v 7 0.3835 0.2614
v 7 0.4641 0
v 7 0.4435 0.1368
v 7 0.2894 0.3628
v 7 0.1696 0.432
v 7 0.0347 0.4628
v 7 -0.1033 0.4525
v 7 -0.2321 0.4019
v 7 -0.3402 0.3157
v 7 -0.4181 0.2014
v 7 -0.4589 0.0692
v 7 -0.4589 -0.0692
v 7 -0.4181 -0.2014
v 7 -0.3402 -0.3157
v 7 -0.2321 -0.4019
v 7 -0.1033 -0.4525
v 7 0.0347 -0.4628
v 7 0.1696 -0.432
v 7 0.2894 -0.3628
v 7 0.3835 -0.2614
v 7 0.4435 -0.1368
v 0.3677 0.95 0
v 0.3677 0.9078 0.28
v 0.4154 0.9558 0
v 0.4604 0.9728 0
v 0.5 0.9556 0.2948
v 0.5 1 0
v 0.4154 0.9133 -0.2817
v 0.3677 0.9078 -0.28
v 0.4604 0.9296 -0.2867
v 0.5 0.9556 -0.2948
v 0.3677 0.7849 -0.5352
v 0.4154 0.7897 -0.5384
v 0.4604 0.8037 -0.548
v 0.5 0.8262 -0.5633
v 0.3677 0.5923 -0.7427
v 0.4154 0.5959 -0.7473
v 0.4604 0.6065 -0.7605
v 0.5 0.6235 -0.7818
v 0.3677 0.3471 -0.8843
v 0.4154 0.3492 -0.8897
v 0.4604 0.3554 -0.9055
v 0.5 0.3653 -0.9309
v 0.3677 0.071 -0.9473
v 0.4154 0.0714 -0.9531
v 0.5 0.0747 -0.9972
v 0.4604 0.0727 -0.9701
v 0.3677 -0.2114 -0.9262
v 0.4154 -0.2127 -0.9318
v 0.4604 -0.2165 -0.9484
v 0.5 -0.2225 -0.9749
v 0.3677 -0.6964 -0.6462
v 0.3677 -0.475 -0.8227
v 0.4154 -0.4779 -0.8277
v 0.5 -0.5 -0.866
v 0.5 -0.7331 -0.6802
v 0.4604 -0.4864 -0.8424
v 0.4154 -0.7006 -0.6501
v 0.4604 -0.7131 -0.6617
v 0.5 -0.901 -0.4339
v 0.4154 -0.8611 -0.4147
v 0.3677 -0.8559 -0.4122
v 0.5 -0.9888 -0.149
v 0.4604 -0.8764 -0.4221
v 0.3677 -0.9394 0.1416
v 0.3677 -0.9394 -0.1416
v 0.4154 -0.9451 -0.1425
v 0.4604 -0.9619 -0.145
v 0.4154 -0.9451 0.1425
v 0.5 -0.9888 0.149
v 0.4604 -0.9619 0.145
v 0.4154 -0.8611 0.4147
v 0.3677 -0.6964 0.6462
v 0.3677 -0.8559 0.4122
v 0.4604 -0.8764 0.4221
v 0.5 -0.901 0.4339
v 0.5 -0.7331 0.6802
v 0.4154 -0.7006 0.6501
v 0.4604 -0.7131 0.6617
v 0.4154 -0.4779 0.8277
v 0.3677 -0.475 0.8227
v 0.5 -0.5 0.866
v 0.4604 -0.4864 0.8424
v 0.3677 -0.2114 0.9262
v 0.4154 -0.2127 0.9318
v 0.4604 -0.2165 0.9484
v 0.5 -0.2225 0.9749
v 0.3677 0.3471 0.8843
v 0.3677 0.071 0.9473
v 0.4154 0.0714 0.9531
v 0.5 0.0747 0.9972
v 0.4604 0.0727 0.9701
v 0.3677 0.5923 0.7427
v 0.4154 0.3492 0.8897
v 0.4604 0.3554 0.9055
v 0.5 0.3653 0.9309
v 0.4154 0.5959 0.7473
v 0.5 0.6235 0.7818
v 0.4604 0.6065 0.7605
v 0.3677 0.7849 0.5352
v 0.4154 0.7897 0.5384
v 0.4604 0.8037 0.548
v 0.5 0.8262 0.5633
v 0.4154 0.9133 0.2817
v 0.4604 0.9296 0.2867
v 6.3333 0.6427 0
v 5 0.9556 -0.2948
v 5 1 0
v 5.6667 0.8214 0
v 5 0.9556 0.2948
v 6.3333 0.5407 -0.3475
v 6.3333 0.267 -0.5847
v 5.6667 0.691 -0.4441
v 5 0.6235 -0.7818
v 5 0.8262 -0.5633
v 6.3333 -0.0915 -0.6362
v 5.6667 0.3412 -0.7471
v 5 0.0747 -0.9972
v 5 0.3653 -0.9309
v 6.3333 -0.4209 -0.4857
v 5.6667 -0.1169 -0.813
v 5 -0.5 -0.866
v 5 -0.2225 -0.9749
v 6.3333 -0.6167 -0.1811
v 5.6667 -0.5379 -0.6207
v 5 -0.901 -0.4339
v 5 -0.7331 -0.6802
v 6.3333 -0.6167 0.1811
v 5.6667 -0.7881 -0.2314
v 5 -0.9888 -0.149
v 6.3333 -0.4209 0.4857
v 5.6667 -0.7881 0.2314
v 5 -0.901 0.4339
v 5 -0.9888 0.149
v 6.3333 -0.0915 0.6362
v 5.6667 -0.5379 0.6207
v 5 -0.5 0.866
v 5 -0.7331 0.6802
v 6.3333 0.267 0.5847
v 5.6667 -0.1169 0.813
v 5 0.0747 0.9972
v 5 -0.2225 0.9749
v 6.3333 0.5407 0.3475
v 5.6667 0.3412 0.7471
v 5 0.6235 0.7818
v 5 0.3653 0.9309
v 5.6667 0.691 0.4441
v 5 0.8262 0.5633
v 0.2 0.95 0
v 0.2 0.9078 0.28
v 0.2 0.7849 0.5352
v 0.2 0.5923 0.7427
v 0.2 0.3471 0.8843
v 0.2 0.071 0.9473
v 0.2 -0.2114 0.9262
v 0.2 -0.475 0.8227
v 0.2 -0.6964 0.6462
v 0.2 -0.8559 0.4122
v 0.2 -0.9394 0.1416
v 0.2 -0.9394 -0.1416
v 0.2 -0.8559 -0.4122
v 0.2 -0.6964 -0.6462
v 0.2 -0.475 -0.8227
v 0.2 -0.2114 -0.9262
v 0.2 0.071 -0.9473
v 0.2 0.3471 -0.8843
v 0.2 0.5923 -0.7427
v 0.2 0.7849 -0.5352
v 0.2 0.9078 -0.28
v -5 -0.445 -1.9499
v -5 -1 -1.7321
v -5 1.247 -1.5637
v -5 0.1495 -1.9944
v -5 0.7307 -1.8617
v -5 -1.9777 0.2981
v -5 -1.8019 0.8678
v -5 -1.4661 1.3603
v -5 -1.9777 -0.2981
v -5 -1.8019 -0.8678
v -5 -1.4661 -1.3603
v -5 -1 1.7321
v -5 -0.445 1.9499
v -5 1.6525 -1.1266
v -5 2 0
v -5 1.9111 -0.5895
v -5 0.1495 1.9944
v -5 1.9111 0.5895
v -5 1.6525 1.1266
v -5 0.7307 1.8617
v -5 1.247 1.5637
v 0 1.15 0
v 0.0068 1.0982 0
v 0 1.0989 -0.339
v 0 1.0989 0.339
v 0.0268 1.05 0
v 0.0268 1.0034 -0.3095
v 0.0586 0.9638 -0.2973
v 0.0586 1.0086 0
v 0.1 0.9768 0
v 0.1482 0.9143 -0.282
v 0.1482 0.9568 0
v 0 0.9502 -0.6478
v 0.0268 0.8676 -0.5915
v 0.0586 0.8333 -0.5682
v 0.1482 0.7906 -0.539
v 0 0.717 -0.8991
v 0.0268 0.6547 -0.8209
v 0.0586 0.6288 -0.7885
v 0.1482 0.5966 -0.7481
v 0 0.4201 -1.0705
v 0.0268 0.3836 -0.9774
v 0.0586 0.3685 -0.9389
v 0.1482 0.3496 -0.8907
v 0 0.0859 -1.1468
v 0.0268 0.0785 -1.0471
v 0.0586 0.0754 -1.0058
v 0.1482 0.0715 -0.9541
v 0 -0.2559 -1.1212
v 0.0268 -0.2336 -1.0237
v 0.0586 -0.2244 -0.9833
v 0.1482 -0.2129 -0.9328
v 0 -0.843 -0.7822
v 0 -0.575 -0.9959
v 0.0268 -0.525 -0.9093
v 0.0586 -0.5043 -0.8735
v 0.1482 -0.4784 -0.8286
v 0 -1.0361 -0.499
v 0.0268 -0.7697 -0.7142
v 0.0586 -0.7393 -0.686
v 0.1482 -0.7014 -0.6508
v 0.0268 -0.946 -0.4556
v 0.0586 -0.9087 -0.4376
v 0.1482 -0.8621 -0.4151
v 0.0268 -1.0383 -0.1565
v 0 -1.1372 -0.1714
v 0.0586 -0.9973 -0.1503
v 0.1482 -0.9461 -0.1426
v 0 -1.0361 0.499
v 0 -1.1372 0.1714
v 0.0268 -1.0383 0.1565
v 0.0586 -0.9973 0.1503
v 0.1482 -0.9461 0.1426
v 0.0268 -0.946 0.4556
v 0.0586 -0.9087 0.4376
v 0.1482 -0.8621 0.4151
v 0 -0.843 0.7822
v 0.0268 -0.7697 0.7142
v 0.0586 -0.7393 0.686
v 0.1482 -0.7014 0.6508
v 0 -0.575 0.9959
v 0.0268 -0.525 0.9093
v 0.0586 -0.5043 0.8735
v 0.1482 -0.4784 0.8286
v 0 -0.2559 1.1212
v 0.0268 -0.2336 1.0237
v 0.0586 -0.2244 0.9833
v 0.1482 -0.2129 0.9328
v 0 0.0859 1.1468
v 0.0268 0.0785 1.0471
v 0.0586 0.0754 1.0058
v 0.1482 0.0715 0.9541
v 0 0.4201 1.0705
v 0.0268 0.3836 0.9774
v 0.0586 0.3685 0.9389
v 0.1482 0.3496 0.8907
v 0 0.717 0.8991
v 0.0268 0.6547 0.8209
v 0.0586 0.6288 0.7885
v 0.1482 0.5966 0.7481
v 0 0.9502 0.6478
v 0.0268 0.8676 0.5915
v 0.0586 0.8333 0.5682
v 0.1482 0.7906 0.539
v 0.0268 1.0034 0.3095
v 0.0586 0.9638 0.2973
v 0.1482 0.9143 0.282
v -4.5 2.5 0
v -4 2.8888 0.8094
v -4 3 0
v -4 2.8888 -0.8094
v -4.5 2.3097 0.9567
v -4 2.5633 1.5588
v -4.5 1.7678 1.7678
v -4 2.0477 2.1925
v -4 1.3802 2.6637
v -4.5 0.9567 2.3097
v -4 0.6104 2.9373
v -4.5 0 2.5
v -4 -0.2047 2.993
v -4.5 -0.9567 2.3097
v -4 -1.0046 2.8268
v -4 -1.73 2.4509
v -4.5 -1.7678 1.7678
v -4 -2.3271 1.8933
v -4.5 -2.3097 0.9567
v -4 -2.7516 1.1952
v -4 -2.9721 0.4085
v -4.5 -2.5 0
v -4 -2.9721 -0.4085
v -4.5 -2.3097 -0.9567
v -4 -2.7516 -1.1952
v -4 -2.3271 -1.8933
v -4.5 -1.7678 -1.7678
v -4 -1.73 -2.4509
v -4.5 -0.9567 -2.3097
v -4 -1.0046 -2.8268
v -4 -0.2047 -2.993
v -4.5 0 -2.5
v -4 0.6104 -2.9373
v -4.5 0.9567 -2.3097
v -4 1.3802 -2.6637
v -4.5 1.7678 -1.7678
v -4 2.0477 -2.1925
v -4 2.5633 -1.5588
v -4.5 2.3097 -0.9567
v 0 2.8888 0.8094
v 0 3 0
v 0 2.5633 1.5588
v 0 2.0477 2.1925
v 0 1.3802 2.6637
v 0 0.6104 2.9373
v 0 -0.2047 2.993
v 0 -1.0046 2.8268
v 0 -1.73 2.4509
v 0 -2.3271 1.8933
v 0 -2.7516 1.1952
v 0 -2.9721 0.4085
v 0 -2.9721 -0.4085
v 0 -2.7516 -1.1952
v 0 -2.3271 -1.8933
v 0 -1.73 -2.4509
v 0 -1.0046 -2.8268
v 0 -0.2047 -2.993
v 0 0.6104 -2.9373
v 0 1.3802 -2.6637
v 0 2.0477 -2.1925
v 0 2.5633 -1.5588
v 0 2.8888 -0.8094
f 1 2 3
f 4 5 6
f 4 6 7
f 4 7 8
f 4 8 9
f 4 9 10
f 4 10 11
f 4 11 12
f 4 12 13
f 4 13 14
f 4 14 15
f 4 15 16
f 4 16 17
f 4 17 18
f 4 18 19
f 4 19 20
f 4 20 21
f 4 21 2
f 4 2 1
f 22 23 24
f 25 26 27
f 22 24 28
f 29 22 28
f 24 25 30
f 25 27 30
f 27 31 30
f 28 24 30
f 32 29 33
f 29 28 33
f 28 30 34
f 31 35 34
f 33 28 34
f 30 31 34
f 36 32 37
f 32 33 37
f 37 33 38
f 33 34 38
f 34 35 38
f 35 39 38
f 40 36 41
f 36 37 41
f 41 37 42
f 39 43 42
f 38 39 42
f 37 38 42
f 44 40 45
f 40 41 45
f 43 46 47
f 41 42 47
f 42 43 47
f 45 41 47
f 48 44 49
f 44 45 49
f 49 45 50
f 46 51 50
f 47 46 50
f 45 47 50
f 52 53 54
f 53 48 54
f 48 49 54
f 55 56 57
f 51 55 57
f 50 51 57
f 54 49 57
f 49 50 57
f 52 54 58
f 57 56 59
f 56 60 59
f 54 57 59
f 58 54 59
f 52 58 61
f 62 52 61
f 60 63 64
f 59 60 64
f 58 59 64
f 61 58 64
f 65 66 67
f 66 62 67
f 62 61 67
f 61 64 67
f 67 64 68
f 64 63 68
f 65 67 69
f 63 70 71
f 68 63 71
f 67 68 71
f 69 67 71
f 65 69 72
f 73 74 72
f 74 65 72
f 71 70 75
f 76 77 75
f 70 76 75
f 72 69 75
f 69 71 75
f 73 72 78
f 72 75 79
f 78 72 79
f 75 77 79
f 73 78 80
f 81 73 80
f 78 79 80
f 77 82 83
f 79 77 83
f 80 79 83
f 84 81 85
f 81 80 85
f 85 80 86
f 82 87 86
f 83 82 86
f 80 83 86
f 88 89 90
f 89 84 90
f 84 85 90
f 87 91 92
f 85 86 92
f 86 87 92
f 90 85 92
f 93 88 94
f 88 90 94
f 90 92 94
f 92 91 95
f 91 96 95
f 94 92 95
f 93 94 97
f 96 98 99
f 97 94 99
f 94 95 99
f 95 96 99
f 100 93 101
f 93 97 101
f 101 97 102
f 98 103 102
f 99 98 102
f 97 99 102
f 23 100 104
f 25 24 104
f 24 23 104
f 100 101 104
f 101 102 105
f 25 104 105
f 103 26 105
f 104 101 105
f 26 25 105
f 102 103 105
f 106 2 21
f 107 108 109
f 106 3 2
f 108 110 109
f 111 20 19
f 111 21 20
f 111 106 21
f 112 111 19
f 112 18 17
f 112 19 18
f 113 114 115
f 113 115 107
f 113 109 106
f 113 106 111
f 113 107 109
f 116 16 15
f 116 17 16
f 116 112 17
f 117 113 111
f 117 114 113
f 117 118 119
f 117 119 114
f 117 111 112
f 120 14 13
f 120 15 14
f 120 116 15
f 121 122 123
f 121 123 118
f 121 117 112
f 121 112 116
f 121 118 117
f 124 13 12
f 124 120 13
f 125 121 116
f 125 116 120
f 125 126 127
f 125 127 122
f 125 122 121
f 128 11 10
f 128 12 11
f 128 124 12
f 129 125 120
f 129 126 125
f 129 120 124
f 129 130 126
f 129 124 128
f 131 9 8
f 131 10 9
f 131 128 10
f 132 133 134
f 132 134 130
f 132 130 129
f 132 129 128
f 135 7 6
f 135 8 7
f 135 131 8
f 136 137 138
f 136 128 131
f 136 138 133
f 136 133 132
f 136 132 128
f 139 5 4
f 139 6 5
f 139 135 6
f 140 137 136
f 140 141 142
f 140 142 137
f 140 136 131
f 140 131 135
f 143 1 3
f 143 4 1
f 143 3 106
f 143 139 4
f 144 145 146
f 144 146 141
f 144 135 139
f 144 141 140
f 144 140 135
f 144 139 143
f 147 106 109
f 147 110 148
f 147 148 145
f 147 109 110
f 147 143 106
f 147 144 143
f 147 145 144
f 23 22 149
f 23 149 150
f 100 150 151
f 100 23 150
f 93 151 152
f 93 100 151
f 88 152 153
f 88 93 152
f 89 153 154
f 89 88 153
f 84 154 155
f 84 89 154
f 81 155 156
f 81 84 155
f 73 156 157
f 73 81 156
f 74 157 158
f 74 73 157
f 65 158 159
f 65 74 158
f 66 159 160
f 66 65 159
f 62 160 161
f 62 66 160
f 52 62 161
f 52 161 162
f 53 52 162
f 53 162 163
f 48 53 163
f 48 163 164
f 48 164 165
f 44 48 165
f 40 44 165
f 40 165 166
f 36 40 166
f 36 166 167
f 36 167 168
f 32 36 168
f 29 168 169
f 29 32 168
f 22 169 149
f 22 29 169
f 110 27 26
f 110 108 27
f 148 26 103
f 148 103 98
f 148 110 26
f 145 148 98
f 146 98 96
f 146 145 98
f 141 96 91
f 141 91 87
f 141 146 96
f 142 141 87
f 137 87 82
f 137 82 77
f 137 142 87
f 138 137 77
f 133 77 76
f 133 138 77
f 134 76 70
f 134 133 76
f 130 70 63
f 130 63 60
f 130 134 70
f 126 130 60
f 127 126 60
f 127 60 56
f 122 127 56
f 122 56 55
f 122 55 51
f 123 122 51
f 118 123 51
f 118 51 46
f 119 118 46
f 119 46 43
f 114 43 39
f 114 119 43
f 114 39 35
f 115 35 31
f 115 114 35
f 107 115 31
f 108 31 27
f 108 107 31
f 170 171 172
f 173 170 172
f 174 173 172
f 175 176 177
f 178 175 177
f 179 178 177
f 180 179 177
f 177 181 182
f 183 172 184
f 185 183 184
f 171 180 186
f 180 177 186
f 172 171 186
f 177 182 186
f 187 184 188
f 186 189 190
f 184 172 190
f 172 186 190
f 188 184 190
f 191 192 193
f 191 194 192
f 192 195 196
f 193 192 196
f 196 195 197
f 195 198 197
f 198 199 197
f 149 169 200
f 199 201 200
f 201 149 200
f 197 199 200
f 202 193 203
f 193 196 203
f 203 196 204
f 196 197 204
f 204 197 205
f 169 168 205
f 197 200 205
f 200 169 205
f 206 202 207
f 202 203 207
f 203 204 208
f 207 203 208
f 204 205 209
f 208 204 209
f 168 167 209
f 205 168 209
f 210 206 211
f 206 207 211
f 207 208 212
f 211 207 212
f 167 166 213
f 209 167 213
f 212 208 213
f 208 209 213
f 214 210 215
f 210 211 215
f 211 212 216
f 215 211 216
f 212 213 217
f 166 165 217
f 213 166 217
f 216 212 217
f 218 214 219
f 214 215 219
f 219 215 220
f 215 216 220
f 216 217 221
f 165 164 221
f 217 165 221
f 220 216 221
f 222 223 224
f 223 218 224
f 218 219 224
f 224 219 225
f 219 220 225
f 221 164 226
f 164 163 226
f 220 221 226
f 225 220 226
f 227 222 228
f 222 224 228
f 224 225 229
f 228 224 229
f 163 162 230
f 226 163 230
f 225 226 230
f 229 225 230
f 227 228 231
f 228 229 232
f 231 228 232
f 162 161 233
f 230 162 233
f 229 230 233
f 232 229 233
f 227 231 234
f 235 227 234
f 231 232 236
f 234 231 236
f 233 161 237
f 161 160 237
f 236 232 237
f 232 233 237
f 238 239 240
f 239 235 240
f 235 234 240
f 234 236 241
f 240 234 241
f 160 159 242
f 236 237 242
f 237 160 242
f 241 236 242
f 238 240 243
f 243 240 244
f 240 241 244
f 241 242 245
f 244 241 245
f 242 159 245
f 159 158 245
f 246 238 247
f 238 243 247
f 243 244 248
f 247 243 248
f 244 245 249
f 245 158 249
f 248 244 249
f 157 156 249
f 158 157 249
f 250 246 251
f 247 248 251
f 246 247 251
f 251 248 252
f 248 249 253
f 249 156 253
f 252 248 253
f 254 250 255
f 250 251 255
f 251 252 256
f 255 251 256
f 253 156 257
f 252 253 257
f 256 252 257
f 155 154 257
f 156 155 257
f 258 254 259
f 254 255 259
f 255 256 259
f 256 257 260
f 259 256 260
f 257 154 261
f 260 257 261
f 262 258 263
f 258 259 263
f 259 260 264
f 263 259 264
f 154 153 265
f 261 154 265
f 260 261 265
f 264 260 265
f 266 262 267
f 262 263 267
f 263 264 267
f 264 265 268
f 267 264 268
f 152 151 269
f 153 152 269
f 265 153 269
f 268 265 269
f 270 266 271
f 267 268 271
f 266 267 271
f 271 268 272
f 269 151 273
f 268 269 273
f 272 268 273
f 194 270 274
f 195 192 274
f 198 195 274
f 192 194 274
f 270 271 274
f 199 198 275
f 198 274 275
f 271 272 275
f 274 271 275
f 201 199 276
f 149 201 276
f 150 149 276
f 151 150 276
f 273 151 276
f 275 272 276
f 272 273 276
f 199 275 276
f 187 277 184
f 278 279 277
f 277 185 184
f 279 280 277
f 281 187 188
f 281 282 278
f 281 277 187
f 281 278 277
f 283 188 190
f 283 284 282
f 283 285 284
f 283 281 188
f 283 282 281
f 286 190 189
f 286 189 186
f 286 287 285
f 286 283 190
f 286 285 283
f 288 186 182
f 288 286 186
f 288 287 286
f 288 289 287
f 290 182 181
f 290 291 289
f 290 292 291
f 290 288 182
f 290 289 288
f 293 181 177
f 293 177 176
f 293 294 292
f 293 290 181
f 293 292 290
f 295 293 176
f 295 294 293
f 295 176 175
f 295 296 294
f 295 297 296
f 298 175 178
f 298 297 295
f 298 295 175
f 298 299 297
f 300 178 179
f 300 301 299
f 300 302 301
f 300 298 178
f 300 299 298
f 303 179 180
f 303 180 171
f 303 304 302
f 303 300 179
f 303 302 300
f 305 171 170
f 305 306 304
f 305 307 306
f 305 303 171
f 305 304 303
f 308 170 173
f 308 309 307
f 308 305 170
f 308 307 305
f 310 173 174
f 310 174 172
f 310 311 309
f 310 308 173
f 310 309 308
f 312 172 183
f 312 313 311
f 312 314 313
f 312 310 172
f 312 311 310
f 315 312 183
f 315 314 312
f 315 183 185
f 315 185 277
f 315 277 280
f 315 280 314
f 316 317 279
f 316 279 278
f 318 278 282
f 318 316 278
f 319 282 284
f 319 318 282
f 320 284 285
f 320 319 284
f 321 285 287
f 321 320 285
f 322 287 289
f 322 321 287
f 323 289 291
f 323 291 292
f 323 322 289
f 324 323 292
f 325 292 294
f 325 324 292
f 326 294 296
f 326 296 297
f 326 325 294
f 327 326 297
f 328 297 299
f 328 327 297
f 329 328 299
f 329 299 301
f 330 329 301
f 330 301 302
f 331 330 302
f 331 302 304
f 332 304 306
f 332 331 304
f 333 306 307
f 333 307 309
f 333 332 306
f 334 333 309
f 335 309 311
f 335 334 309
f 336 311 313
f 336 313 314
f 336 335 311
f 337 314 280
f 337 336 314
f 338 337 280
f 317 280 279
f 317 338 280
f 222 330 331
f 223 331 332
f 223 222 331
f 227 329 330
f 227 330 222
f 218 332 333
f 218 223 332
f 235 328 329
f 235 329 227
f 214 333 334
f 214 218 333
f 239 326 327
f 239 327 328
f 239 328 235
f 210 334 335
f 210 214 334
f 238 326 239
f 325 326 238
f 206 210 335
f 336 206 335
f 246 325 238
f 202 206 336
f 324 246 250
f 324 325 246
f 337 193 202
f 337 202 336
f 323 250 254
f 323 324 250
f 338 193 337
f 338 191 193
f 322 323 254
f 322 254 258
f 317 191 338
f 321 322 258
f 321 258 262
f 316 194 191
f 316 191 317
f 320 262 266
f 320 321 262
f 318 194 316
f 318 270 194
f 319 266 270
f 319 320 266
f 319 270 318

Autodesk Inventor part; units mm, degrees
ref_plane "YZ Plane" through (0, 0, 0) normal (1, 0, 0) x (0, 1, 0)
ref_plane "XZ Plane" through (0, 0, 0) normal (0, 1, 0) x (-1, 0, 0)
ref_plane "XY Plane" through (0, 0, 0) normal (0, 0, 1) x (1, 0, 0)
sketch "Sketch_1" plane through (0, 0, 0) normal (0, 0, 1) x (1, 0, 0)
  line L0 (0, 0) -> (-5, 0)
  line L1 (-5, 0) -> (-5, 2)
  line L2 (-5, 2) -> (-4, 3)
  line L3 (-4, 3) -> (0.5, 3)
  line L4 (0.5, 3) -> (0.5, 0)
  line L5 (0.5, 0) -> (-5, 0)
revolve "Revolution1" add sketch "Sketch_1" angle 360 about axis through (0, 0, 0) along (1, 0, 0)
sketch "Sketch_2" plane through (0, 0, 0) normal (0, 0, 1) x (1, 0, 0)
  line L0 (7, 0) -> (0, 0)
  line L1 (0, 0) -> (0, 1)
  line L2 (0, 1) -> (5, 1)
  line L3 (5, 1) -> (7, 0.4641)
  line L4 (7, 0.4641) -> (7, 0)
  line L5 (7, 0) -> (0, 0)
revolve "Revolution2" add sketch "Sketch_2" angle 360 about axis through (7, 0, 0) along (1, 0, 0)
sketch "Sketch_13" plane through (0, 0, 0) normal (0, 0, 1) x (1, 0, 0)
  line L0 (50, 0) -> (-50, 0)
  line L1 (0, 6) -> (0, 1.15)
  arc A0 (0, 1.15) -> (0.2, 0.95) centre (0.2, 1.15) ccw
  line L2 (0.2, 0.95) -> (0.3677, 0.95)
  arc A1 (0.3677, 0.95) -> (0.5, 1) centre (0.3677, 1.15) ccw
  line L3 (0.5, 1) -> (0.5, 6)
  line L4 (0.5, 6) -> (0, 6)
revolve "Revolution3" cut sketch "Sketch_13" angle 360 about axis through (50, 0, 0) along (1, 0, 0)
properties part number "SFPSA6-P2-L5-B5"
